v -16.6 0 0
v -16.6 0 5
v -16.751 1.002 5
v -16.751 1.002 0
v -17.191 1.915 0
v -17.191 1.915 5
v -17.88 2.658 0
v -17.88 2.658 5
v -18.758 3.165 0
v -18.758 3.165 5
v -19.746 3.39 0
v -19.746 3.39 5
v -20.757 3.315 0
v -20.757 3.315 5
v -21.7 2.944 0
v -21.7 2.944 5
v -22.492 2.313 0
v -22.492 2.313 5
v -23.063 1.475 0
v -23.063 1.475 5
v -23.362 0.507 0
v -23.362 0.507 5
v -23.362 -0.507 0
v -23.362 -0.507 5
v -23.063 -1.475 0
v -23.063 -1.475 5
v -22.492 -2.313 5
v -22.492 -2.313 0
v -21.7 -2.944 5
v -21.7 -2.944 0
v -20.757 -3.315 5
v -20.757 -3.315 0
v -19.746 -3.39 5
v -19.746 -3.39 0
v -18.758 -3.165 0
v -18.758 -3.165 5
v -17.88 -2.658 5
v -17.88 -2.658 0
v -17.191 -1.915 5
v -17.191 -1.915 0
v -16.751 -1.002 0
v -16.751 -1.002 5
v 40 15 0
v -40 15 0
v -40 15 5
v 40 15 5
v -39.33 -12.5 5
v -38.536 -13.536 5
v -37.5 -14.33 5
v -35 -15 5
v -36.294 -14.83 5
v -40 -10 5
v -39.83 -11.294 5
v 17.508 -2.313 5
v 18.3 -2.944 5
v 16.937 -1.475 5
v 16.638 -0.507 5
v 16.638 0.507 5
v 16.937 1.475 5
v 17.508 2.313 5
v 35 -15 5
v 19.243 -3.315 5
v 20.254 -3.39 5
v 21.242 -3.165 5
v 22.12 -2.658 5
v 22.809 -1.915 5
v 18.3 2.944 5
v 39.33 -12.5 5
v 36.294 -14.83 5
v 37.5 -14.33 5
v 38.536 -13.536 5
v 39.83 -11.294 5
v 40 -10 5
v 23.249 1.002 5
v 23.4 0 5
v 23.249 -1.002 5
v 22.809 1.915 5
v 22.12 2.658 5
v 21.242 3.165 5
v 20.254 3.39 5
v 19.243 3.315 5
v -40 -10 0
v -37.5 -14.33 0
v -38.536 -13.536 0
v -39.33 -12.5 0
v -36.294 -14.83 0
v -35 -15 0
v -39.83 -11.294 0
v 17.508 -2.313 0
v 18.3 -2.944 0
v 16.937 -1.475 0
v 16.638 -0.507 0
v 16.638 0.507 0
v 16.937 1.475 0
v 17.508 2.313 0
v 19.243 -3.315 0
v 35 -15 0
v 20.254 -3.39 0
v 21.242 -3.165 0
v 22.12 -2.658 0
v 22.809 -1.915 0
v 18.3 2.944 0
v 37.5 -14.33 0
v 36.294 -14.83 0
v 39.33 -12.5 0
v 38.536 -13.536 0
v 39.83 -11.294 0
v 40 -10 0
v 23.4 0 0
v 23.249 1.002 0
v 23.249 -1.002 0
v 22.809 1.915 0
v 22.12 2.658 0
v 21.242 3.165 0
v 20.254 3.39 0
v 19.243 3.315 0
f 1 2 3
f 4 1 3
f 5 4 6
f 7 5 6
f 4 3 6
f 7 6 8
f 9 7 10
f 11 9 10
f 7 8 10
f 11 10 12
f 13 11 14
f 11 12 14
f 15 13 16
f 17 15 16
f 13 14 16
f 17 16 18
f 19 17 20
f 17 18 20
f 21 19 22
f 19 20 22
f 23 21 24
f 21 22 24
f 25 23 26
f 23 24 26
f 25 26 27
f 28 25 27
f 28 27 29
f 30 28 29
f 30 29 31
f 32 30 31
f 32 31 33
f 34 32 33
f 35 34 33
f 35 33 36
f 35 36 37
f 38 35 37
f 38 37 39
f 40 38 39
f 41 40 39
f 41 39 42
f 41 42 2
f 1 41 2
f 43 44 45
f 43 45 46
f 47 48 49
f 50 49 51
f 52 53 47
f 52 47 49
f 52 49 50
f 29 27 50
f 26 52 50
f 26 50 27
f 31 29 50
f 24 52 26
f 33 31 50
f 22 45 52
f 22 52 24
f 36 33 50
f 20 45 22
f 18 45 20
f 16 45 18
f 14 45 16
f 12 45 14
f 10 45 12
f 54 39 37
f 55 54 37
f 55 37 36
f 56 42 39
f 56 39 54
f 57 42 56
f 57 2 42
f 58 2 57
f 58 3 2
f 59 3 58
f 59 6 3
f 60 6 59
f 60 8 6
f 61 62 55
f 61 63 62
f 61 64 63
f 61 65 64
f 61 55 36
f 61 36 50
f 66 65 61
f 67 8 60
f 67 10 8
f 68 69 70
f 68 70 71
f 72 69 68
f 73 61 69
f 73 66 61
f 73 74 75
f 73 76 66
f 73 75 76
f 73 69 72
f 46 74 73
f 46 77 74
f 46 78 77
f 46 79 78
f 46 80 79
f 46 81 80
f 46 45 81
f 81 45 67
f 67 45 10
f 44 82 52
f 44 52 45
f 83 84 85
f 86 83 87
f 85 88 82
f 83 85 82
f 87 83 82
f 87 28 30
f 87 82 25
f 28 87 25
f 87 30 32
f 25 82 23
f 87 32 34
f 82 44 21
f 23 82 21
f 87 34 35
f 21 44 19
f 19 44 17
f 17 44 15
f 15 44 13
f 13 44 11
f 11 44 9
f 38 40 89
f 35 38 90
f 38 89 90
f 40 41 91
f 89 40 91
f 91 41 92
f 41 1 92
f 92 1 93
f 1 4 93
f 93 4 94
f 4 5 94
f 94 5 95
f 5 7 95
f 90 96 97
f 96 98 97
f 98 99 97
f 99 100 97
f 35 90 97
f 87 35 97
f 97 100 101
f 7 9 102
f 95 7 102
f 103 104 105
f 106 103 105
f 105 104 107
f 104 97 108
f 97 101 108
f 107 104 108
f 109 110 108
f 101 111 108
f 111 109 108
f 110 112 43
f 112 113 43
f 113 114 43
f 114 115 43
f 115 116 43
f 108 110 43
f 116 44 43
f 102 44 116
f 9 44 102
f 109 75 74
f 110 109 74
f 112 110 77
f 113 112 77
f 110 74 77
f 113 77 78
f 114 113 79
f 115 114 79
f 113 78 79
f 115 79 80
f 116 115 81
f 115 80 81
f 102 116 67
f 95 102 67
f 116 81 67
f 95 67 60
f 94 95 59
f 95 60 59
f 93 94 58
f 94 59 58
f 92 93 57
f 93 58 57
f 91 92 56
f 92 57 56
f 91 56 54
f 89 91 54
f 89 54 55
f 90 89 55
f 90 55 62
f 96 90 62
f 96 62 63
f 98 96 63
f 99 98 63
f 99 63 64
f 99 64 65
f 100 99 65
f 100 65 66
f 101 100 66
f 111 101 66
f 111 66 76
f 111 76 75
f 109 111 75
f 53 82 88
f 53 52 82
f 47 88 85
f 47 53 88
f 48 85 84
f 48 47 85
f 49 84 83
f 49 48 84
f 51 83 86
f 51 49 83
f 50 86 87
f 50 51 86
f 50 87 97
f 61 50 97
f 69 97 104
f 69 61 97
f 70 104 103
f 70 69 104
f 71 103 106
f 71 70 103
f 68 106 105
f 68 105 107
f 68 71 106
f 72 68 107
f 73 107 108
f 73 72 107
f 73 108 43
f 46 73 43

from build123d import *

# Parameters (mm, degrees)
IZIM1_W                     = 80
IZIM1_H                     = 30
Y_KSEKLIK_EKSTR_ZYON1_DEPTH = 5
RADYUS2_R                   = 5
IZIM2_R                     = 3.4
KES_EKSTR_ZYON1_DEPTH       = 8


with BuildPart() as part:
    # Çizim1 → Yükseklik-Ekstrüzyon1 (new body)
    with BuildSketch(Plane.XY):
        Rectangle(IZIM1_W, IZIM1_H)
    extrude(amount=Y_KSEKLIK_EKSTR_ZYON1_DEPTH)

    # Radyus2
    radyus2_edges = [part.edges().sort_by_distance(p)[0] for p in [
        (40, -15, 2.5),
        (-40, -15, 2.5),
    ]]
    fillet(radyus2_edges, radius=RADYUS2_R)

    # Çizim2 → Kes-Ekstrüzyon1 (cut)
    with BuildSketch(Plane.XY.offset(5)):
        with Locations((-20, 0)):
            Circle(IZIM2_R)
        with Locations((20, 0)):
            Circle(IZIM2_R)
    extrude(amount=-KES_EKSTR_ZYON1_DEPTH, mode=Mode.SUBTRACT)


solid = part.part
